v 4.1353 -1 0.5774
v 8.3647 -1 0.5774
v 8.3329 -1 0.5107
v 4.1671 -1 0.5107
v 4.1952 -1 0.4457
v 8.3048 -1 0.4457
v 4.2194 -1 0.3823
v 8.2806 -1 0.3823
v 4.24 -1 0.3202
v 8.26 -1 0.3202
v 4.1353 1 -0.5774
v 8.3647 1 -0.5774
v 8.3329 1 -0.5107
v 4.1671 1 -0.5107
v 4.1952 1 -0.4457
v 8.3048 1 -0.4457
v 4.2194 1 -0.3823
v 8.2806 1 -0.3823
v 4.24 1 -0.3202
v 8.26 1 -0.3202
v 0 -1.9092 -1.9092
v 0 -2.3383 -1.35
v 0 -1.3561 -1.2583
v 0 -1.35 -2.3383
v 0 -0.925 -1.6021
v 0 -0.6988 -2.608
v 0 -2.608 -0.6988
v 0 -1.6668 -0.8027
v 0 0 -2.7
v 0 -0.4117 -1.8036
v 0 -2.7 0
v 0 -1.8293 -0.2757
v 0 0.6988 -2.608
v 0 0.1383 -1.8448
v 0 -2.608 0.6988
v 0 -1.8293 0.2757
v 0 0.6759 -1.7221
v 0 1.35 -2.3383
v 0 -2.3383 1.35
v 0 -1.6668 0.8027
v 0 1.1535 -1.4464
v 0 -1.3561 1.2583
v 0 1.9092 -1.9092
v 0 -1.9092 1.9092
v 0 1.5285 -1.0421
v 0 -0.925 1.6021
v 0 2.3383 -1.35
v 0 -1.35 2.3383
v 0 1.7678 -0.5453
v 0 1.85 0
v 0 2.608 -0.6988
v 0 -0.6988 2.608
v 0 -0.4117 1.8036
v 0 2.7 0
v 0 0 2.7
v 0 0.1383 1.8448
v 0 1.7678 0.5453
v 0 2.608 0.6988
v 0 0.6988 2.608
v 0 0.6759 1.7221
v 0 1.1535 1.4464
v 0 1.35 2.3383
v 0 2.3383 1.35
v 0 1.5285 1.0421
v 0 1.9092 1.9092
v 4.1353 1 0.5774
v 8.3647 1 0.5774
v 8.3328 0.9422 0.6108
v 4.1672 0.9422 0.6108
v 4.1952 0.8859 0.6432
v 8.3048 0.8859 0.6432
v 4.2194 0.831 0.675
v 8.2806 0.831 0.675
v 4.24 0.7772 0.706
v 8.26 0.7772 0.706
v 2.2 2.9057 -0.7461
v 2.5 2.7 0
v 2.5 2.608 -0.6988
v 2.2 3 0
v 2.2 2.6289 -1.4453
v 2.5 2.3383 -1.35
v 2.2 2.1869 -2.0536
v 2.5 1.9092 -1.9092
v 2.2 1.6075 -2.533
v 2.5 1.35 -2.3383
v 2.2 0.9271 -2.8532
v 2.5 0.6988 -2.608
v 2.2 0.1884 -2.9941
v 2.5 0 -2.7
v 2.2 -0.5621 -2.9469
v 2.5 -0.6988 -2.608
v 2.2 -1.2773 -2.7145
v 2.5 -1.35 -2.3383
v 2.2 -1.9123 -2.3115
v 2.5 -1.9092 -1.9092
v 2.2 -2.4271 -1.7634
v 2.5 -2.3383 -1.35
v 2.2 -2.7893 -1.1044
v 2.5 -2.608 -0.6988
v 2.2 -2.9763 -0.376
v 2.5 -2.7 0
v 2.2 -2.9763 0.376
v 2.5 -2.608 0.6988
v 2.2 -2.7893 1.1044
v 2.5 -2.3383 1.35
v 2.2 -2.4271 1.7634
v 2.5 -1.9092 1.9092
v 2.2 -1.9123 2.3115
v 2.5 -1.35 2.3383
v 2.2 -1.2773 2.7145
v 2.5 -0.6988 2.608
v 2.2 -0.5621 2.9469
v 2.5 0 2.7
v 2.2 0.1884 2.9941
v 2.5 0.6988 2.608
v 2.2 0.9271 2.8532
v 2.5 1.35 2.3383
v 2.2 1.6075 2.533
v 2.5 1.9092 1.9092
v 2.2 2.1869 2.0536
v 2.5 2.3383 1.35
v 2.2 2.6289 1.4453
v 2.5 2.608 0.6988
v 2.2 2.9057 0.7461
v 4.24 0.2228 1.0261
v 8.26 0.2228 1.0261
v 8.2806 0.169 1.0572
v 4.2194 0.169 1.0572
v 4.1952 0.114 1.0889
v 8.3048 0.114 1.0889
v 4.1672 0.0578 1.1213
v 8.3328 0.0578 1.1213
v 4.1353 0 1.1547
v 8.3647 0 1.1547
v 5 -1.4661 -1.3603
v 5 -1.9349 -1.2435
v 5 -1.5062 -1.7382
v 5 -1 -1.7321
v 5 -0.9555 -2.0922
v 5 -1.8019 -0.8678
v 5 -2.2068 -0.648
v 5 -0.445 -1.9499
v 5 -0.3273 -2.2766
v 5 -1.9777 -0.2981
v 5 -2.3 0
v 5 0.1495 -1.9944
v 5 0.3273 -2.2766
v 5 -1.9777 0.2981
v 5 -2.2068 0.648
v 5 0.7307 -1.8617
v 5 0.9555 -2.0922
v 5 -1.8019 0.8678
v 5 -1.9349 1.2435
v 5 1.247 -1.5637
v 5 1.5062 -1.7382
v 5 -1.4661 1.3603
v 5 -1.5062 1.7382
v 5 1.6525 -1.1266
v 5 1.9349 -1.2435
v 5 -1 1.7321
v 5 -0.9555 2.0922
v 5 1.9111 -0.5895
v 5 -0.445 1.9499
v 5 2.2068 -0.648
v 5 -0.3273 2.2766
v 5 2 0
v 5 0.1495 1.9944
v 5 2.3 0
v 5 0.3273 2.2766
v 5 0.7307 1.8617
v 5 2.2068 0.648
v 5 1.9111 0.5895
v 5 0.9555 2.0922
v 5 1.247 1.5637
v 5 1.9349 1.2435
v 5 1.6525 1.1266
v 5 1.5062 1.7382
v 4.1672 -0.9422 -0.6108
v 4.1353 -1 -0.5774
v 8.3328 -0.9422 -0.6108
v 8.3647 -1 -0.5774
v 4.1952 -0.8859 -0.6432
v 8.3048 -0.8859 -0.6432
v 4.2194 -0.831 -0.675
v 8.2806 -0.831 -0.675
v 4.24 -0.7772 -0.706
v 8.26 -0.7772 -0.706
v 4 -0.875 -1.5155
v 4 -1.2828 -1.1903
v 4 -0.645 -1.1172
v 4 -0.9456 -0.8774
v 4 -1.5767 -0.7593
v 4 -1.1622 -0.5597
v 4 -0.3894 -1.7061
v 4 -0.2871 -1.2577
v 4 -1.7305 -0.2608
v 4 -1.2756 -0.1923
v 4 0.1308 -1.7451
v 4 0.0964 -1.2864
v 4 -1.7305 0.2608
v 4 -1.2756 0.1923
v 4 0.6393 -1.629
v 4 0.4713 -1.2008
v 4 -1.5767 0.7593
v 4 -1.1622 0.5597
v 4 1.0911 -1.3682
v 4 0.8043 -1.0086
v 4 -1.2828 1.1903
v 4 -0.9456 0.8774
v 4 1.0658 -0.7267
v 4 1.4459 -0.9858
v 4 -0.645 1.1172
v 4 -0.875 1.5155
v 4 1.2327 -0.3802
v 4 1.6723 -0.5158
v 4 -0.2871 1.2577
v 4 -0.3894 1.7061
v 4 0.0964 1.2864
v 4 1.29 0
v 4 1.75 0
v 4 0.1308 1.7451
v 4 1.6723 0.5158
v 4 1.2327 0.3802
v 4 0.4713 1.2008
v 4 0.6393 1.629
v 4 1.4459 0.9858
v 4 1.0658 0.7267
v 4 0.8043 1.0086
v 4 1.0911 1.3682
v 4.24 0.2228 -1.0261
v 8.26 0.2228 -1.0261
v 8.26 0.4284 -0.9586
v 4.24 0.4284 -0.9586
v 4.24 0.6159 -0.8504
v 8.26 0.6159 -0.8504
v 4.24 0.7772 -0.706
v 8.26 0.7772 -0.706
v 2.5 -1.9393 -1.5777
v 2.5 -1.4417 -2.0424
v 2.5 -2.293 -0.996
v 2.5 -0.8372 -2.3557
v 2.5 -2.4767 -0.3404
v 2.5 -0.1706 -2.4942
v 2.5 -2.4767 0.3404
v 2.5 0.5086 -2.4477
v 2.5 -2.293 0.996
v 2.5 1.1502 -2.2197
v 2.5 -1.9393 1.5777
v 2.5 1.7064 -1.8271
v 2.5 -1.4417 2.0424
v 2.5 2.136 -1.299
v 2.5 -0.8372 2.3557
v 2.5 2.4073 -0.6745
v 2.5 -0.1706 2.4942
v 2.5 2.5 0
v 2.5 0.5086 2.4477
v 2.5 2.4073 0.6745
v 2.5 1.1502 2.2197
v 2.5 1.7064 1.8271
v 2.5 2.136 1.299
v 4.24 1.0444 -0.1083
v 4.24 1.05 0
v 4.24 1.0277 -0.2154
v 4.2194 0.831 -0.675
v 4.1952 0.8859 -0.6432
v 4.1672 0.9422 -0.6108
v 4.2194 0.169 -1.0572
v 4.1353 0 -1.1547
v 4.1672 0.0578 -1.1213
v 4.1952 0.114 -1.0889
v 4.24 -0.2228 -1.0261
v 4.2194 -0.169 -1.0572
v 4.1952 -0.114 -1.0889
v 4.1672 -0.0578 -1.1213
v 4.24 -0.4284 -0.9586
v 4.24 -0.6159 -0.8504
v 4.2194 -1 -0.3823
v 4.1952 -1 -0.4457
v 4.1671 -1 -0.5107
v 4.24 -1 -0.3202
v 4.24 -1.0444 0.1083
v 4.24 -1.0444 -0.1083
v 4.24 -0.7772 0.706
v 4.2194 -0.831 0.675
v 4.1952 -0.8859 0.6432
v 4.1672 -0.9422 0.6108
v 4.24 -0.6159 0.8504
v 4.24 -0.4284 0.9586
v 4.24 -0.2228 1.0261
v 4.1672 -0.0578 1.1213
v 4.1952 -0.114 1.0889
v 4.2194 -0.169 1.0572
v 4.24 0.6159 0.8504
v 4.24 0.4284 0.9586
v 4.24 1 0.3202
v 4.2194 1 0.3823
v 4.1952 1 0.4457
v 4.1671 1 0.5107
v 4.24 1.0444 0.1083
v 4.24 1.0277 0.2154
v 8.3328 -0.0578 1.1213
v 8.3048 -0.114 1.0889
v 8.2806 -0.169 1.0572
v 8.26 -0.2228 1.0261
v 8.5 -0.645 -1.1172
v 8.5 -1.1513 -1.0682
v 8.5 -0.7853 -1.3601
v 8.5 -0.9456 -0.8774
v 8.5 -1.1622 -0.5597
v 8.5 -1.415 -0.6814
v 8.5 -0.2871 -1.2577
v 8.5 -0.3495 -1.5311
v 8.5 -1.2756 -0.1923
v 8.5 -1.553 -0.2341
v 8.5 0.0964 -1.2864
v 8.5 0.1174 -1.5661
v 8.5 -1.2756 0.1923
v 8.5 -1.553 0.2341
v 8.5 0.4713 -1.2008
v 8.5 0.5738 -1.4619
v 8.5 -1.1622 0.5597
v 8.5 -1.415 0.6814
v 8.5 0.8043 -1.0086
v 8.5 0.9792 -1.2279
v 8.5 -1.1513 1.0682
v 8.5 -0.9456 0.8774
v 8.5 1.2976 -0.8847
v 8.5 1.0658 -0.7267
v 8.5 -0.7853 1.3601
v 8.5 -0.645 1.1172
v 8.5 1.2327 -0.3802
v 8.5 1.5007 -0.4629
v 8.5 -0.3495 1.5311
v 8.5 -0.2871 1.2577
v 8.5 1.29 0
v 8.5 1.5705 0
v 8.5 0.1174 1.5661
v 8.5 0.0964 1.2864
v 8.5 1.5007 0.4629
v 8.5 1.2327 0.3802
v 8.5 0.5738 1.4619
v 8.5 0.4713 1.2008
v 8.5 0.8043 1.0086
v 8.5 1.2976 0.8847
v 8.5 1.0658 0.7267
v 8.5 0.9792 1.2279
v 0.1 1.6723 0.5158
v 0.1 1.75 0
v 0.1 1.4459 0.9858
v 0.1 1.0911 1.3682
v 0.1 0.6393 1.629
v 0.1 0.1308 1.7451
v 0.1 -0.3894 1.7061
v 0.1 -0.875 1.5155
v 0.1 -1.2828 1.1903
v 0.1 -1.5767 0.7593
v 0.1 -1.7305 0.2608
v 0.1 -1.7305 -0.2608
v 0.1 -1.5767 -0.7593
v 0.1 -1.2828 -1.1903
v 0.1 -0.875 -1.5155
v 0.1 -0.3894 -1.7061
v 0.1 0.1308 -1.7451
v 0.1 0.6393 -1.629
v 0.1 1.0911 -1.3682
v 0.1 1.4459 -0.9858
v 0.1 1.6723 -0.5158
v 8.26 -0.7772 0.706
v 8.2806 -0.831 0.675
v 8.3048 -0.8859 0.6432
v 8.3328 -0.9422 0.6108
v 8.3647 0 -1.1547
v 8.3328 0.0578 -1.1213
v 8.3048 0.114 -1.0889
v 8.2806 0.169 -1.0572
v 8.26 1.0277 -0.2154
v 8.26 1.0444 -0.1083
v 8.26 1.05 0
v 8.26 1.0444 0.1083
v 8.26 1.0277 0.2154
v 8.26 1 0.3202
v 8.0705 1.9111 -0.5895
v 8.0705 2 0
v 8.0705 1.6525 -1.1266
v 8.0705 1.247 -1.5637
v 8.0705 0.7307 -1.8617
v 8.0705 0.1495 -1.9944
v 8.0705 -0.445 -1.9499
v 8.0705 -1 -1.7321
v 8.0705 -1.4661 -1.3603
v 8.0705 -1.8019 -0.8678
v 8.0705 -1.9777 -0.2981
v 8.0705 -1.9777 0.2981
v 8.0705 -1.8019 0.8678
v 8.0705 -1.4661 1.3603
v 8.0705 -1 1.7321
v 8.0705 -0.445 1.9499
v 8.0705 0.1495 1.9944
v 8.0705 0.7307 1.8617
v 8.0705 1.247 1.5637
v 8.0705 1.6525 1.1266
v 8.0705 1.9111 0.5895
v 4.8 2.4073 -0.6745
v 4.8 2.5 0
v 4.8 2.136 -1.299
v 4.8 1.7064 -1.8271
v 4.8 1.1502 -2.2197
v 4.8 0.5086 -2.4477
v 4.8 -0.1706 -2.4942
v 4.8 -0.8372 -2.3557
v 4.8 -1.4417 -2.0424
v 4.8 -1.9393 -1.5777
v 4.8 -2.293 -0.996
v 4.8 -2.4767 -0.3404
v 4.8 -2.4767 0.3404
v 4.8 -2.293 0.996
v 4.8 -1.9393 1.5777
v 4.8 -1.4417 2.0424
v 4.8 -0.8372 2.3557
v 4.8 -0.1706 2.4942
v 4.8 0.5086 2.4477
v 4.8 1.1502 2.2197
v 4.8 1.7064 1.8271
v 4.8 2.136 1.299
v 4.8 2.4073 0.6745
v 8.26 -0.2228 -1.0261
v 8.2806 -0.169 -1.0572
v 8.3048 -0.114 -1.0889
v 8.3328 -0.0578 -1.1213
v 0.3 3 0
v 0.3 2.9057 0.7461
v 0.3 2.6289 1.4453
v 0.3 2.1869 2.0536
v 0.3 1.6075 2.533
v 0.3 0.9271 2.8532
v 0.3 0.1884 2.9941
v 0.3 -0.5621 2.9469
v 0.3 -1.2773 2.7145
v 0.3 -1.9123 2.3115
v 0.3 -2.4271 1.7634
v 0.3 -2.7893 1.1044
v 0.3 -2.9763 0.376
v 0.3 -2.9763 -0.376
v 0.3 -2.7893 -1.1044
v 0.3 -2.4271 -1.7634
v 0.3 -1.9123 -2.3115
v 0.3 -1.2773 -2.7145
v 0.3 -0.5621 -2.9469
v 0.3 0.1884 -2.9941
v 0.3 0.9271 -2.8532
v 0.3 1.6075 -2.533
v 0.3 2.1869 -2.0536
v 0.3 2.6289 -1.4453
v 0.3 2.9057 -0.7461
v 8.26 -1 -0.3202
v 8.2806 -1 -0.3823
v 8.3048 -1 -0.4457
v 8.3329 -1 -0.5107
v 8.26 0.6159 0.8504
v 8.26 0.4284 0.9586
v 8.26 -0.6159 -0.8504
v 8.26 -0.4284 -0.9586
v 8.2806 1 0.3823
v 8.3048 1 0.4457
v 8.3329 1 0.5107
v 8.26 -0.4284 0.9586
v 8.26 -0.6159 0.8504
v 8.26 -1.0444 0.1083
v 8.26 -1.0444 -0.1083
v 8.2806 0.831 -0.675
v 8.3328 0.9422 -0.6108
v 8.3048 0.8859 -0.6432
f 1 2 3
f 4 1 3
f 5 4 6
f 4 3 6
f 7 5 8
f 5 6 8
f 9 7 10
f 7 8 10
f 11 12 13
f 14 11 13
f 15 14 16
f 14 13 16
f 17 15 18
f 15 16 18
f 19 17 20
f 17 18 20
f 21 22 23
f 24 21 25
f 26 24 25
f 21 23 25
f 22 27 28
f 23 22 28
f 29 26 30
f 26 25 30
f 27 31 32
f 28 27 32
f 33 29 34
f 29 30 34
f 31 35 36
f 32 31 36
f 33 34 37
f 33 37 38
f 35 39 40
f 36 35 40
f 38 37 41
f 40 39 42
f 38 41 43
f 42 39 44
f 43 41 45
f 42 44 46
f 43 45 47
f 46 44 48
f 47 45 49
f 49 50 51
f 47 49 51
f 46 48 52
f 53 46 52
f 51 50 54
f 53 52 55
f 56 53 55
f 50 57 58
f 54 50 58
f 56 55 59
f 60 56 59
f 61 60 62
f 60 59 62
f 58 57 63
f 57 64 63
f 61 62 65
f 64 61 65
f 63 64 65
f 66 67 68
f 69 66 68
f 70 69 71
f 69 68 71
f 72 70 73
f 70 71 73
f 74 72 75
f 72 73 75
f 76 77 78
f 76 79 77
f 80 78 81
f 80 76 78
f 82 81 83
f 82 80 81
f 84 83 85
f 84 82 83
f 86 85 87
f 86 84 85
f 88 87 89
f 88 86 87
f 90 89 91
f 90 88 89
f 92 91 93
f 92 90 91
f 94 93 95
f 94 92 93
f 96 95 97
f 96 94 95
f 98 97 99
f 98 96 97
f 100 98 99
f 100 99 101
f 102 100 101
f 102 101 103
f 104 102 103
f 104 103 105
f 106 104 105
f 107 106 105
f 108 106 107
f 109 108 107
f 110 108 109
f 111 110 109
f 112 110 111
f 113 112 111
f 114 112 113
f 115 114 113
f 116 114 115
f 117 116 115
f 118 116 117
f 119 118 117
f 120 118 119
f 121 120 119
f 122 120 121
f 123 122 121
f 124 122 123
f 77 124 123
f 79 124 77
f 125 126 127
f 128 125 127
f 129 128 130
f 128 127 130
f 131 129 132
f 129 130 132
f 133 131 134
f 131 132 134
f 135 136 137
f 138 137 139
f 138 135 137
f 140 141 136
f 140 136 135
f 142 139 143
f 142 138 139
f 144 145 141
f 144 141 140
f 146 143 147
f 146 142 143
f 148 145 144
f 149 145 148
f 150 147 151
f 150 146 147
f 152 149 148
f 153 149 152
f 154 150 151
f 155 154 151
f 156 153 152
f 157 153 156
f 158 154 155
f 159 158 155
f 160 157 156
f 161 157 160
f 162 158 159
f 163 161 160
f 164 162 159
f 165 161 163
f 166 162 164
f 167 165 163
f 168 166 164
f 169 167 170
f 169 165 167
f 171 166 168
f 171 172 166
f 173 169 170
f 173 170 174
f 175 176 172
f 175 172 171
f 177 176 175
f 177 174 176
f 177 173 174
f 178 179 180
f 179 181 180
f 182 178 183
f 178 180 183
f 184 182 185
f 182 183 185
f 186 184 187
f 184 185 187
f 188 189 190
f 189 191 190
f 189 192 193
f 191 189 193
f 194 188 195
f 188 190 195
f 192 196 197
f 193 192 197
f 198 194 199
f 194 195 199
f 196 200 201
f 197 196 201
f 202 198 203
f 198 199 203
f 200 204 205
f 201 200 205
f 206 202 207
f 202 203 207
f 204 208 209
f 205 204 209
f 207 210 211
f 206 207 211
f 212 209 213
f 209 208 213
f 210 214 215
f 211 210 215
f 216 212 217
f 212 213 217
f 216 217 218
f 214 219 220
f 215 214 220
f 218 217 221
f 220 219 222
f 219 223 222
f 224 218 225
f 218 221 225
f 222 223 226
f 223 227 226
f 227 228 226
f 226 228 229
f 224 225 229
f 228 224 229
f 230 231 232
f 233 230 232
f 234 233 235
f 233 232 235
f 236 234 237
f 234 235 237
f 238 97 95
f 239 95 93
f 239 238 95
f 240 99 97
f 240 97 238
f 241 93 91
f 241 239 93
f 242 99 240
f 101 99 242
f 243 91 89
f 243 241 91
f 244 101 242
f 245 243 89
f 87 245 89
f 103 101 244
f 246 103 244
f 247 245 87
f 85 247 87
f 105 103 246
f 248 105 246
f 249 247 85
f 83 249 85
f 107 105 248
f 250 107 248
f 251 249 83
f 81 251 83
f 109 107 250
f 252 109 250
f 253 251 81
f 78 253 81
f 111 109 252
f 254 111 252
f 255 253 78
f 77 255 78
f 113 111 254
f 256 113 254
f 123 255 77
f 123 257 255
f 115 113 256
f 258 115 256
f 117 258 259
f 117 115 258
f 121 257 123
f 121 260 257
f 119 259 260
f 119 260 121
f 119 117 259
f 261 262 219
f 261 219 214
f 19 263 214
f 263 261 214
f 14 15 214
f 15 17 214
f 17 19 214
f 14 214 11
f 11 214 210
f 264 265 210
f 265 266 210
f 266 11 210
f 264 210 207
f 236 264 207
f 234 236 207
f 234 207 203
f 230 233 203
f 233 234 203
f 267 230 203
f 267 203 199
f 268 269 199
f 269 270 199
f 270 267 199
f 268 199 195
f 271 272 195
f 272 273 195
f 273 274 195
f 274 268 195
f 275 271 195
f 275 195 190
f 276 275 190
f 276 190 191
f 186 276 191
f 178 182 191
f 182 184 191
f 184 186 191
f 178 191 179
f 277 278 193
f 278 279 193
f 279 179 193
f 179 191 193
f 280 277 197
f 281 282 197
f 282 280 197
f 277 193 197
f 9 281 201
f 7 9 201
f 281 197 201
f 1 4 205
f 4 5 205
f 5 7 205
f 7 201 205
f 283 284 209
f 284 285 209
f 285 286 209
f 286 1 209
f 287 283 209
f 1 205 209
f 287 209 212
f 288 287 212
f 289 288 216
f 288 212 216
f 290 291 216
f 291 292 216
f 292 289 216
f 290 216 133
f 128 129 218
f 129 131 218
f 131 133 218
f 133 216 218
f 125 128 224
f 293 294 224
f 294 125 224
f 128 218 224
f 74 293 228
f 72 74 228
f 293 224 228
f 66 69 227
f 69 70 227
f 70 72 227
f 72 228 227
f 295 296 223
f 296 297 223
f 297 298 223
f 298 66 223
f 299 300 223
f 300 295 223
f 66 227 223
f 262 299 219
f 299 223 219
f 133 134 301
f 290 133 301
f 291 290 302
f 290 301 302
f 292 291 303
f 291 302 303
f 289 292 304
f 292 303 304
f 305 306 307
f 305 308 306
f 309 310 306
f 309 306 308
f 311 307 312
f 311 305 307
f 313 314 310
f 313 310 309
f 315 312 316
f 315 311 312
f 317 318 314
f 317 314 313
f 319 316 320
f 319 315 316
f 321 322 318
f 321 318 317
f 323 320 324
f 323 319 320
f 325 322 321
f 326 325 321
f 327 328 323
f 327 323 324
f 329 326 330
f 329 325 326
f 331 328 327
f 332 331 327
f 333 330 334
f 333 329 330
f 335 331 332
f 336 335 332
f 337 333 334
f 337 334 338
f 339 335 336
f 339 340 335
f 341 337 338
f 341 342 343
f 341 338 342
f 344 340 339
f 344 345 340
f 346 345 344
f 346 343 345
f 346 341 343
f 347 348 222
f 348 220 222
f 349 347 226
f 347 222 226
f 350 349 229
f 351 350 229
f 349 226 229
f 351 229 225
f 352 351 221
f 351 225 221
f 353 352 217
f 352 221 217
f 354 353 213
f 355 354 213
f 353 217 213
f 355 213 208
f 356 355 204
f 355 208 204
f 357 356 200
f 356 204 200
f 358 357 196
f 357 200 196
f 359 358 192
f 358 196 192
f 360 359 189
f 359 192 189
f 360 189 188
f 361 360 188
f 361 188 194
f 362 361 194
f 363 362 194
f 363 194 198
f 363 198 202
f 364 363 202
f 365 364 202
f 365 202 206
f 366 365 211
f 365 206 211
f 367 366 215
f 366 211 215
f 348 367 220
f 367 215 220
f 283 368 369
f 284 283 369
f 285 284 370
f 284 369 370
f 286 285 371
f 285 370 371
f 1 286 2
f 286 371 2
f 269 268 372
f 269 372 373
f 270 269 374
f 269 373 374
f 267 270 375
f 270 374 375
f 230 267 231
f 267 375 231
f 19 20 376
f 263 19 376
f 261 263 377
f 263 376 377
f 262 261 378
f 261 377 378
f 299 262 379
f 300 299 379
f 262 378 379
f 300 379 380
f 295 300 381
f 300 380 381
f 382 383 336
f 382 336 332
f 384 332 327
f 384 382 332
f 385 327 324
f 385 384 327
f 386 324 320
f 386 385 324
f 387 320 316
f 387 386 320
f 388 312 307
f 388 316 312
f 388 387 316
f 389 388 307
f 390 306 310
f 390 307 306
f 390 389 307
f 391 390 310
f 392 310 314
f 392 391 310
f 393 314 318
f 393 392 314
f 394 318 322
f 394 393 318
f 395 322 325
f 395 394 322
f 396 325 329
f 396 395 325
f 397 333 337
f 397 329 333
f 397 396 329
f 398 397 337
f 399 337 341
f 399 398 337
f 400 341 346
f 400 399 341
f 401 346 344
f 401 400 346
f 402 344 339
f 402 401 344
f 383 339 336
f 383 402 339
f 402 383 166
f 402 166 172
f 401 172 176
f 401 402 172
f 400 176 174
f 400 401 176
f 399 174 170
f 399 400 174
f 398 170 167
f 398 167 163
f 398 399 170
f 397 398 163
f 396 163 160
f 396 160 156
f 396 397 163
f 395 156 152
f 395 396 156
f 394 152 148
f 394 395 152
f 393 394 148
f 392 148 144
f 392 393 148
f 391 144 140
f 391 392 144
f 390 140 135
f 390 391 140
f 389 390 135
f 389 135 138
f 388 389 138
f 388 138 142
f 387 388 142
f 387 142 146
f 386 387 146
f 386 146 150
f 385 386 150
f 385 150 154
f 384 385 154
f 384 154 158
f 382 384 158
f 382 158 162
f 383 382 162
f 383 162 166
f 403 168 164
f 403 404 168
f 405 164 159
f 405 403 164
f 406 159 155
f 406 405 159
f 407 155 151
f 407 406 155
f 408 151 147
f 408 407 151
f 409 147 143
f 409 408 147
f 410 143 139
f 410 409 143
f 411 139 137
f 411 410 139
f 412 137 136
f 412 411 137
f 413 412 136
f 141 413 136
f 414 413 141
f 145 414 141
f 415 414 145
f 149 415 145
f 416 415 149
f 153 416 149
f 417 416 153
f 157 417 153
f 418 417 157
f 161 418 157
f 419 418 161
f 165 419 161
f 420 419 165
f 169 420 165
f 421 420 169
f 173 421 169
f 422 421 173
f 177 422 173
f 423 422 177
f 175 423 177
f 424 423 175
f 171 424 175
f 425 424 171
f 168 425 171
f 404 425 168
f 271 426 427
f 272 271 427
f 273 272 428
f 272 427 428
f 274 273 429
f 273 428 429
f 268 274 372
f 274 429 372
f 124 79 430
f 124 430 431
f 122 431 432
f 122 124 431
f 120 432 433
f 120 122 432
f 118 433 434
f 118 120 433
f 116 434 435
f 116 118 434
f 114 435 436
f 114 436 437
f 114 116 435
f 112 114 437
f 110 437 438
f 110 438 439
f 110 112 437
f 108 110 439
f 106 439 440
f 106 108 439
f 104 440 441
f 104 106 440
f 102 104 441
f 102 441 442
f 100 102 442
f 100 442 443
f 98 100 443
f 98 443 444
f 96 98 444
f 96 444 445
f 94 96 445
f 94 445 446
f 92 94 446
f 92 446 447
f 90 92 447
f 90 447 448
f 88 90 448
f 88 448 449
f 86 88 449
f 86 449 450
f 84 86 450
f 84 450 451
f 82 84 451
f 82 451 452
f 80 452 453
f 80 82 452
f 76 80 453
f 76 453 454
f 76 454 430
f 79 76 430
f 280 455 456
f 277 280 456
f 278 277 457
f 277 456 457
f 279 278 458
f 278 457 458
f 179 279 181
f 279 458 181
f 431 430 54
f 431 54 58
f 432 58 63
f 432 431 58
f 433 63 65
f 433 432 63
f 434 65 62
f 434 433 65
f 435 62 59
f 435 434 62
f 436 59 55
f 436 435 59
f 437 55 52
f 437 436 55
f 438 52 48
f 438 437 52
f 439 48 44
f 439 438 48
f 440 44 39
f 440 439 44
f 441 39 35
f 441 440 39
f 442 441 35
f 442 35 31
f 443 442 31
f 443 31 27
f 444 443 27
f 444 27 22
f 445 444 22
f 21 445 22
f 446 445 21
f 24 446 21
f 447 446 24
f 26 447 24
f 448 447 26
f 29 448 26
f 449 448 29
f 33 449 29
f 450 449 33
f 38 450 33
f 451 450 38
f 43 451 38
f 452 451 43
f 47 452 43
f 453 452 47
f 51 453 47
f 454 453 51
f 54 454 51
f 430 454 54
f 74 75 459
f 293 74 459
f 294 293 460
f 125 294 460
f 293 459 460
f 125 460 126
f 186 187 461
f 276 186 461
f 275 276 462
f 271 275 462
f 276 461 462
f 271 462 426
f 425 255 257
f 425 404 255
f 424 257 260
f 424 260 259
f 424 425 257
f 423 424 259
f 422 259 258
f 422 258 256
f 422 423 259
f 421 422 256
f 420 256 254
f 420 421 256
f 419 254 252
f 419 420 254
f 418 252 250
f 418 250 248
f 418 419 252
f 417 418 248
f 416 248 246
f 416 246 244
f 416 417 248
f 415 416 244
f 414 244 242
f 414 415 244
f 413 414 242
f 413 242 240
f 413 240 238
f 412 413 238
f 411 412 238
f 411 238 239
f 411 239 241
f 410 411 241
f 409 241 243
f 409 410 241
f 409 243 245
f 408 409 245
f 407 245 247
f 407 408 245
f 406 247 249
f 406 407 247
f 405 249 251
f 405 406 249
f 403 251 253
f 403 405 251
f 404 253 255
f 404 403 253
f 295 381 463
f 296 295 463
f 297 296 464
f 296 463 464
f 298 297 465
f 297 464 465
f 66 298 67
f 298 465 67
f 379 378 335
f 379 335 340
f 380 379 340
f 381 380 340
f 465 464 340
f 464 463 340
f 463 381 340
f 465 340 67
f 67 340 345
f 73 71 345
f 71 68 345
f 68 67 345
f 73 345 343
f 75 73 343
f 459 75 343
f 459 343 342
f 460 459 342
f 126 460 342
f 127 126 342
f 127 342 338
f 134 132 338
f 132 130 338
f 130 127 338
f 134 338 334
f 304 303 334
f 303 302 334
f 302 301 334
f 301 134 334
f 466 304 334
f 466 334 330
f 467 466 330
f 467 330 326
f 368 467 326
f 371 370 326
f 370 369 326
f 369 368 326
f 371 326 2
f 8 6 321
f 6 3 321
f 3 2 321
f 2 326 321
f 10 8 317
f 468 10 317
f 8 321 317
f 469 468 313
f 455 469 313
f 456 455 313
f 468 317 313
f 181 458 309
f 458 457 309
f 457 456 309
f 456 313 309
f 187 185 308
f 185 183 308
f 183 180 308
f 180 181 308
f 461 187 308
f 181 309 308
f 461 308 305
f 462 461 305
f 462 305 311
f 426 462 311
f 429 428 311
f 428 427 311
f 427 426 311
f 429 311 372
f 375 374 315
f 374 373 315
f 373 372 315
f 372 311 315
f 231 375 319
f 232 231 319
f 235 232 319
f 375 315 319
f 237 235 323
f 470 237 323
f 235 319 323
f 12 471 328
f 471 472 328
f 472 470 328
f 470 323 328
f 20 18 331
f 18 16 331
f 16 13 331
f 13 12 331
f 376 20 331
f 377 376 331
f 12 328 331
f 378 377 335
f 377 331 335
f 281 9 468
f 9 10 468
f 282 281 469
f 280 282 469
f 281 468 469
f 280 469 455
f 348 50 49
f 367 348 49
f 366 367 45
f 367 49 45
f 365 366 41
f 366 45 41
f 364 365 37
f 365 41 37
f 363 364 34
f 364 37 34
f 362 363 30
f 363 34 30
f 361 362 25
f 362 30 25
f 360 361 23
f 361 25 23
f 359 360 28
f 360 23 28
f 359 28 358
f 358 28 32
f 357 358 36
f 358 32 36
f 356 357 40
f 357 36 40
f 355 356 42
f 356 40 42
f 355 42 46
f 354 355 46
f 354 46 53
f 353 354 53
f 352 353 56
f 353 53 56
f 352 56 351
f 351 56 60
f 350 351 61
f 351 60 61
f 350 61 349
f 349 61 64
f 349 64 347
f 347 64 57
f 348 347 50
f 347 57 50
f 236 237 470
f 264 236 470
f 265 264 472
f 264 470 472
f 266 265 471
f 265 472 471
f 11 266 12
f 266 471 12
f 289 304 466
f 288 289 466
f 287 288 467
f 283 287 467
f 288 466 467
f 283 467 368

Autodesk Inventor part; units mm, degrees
sketch "Sketch_1" plane through (0, 0, 0) normal (0, 0, 1) x (1, 0, 0)
  line L0 (8.5, 0) -> (0, 0)
  line L1 (0, 0) -> (0, 2.7)
  line L2 (0, 2.7) -> (0.3, 3)
  line L3 (0.3, 3) -> (2.2, 3)
  line L4 (2.2, 3) -> (2.5, 2.7)
  line L5 (2.5, 2.7) -> (2.5, 2.5)
  line L6 (2.5, 2.5) -> (4.8, 2.5)
  line L7 (4.8, 2.5) -> (5, 2.3)
  line L8 (5, 2.3) -> (5, 2)
  line L9 (5, 2) -> (8.0705, 2)
  line L10 (8.0705, 2) -> (8.5, 1.5705)
  line L11 (8.5, 1.5705) -> (8.5, 0)
  line L12 (8.5, 0) -> (0, 0)
revolve "Revolution1" add sketch "Sketch_1" angle 360 about axis through (8.5, 0, 0) along (1, 0, 0)
thread "Thread1" size "M4x0.7" class "6g" standard "ISO Metric profile" length 2.5705
sketch "Sketch_2" plane through (0, 0, 0) normal (0, 0, 1) x (1, 0, 0)
  line L0 (8.5, 0) -> (0, 0)
  line L1 (0, 0) -> (0, 1.85)
  line L2 (0, 1.85) -> (0.1, 1.75)
  line L3 (0.1, 1.75) -> (4, 1.75)
  line L4 (4, 1.75) -> (4, 1.29)
  line L5 (4, 1.29) -> (4.24, 1.05)
  line L6 (4.24, 1.05) -> (8.26, 1.05)
  line L7 (8.26, 1.05) -> (8.5, 1.29)
  line L8 (8.5, 1.29) -> (8.5, 0)
  line L9 (8.5, 0) -> (0, 0)
revolve "Revolution2" cut sketch "Sketch_2" angle 360 about axis through (8.5, 0, 0) along (1, 0, 0)
sketch "Sketch_3" plane through (8.5, 0, 0) normal (1, 0, 0) x (0, 1, 0)
  line L0 (-1, -0.5774) -> (0, -1.1547)
  line L1 (0, -1.1547) -> (1, -0.5774)
  line L2 (1, -0.5774) -> (1, 0.5774)
  line L3 (1, 0.5774) -> (0, 1.1547)
  line L4 (0, 1.1547) -> (-1, 0.5774)
  line L5 (-1, 0.5774) -> (-1, -0.5774)
extrude "Extrusion1" cut sketch "Sketch_3" against normal blind 4.5
ref_plane "IP_screw_XY" through (2.5, 0, 0) normal (1, 0, 0) x (0, 0, -1)
ref_plane "IP_screw_YZ" through (2.5, 0, 0) normal (0, 0, -1) x (0, 1, 0)
ref_plane "IP_screw_ZX" through (2.5, 0, 0) normal (0, 1, 0) x (1, 0, 0)
properties part number "VPM46-6"
